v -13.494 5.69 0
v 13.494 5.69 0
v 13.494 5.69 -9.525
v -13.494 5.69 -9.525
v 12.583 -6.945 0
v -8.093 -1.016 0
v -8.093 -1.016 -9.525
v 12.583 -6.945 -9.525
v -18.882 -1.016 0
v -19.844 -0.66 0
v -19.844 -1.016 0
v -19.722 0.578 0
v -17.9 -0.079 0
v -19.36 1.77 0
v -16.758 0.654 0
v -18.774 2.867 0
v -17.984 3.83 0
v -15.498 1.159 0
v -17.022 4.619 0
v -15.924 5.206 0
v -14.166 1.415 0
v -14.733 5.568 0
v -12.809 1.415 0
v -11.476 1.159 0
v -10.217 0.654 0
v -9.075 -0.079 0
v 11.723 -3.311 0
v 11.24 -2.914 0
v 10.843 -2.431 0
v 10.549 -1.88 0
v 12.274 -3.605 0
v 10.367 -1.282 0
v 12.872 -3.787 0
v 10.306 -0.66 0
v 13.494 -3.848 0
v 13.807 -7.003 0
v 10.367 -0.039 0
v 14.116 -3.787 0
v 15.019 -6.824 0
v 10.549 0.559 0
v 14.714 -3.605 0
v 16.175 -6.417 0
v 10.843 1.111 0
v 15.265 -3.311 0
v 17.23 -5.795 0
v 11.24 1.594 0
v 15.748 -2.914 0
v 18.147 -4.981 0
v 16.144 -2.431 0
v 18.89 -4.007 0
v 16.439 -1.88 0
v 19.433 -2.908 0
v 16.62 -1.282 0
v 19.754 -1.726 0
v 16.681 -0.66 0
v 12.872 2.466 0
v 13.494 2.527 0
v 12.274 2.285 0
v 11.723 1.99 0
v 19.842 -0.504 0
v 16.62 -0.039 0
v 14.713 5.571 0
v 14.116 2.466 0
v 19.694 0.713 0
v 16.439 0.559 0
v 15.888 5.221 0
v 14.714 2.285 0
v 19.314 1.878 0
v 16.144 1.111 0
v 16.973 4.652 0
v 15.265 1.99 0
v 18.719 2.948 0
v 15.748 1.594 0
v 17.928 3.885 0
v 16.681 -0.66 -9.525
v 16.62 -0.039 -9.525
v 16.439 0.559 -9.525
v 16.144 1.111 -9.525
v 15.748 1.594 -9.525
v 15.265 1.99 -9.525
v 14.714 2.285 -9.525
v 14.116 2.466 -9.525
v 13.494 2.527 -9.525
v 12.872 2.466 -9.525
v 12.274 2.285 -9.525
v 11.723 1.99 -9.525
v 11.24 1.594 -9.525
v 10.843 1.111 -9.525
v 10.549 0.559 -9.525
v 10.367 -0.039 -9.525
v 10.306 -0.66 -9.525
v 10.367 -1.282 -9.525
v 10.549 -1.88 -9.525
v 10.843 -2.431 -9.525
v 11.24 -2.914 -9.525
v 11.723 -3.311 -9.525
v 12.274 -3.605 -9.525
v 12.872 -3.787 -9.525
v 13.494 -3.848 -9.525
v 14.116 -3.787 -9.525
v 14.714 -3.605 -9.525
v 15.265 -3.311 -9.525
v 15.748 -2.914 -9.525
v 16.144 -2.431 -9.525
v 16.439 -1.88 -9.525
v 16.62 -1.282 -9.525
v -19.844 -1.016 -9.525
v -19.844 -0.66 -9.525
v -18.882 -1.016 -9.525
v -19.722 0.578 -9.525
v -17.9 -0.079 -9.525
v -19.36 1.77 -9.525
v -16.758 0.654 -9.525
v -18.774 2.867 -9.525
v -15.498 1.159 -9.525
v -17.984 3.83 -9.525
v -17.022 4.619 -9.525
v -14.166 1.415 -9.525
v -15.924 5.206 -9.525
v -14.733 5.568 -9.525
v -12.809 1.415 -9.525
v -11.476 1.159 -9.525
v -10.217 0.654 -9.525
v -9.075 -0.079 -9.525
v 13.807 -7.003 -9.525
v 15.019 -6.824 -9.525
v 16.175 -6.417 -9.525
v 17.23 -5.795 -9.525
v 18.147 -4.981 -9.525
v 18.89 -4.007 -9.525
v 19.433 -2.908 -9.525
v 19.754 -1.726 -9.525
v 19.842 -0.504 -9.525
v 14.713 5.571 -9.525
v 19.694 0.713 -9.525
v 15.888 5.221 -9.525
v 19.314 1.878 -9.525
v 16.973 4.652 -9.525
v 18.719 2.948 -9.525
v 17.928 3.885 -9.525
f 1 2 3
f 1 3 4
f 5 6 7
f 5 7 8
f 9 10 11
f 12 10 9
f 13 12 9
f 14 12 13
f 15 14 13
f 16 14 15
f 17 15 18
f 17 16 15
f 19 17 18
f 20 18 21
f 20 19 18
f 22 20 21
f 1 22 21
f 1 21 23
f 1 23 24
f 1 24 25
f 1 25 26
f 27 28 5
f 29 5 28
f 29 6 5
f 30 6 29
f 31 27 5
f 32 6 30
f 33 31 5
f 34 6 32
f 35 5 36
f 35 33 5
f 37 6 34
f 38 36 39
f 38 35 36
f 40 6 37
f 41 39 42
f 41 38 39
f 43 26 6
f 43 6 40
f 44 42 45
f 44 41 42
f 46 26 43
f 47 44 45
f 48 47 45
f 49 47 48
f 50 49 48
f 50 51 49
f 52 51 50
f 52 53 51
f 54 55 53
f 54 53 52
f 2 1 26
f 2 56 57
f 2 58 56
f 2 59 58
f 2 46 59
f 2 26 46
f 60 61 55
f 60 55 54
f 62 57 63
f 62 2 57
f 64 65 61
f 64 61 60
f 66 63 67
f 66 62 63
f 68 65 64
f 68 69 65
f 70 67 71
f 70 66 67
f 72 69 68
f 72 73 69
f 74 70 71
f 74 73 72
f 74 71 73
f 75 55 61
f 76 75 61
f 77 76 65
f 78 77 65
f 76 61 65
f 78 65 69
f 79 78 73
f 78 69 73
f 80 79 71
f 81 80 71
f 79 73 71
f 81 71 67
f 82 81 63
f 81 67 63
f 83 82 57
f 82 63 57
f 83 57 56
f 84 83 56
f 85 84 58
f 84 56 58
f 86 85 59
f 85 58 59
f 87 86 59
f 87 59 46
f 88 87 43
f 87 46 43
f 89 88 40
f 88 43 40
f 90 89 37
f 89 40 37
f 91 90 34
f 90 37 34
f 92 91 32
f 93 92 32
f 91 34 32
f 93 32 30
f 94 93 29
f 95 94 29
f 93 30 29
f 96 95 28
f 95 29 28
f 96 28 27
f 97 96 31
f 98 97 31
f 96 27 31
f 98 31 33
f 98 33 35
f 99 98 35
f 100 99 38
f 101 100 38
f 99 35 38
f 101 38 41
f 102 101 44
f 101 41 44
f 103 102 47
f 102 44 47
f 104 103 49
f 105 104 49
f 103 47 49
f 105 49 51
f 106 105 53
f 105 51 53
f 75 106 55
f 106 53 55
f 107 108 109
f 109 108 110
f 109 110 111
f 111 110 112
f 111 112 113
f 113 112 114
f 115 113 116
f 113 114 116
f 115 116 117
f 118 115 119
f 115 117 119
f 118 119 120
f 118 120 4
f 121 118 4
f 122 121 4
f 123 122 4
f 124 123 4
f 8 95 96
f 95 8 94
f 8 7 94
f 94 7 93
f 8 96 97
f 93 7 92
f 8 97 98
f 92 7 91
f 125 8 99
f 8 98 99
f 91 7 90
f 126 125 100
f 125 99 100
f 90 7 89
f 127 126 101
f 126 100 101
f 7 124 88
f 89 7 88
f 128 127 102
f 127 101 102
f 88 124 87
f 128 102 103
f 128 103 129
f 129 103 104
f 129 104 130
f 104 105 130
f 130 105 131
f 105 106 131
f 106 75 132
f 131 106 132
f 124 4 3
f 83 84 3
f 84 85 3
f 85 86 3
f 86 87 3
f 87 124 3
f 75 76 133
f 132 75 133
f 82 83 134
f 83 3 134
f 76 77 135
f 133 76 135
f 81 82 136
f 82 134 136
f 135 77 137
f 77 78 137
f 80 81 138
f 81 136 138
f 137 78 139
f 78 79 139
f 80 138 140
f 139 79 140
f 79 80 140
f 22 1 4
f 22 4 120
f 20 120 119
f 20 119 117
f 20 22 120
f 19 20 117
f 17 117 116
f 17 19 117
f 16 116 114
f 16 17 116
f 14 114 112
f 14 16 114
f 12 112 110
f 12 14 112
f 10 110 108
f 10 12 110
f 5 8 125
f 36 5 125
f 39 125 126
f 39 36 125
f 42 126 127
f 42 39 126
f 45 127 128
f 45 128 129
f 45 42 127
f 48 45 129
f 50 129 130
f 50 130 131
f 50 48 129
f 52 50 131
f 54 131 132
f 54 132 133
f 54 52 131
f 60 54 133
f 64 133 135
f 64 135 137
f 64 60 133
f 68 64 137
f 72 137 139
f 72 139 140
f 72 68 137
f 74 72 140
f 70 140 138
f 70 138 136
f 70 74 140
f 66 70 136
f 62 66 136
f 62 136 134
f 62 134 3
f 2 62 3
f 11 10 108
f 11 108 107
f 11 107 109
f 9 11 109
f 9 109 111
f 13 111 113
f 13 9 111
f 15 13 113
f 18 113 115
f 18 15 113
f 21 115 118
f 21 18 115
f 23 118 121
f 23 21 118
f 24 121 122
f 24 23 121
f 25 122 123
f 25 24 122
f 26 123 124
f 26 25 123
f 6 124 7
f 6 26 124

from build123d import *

# Parameters (mm, degrees)
SKETCH1_R           = 3.1877
BOSS_EXTRUDE1_DEPTH = 9.525


with BuildPart() as part:
    # Sketch1 → Boss-Extrude1 (new body)
    with BuildSketch(Plane.XY):
        with BuildLine():
            Line((-19.84375, -1.016), (-18.881836189, -1.016))
            ThreePointArc((-18.881836189, -1.016), (-13.4874, 1.4478), (-8.092963811, -1.016))
            Line((-8.092963811, -1.016), (12.583078625, -6.944759764))
            ThreePointArc((12.583078625, -6.944759764), (19.827318682, -1.116916975), (13.49375, 5.6896))
            Line((13.49375, 5.6896), (-13.49375, 5.6896))
            ThreePointArc((-13.49375, 5.6896), (-17.983878061, 3.829728061), (-19.84375, -0.6604))
            Line((-19.84375, -0.6604), (-19.84375, -1.016))
        make_face()
        with Locations((13.49375, -0.6604)):
            Circle(SKETCH1_R, mode=Mode.SUBTRACT)
    extrude(amount=-BOSS_EXTRUDE1_DEPTH)


solid = part.part
